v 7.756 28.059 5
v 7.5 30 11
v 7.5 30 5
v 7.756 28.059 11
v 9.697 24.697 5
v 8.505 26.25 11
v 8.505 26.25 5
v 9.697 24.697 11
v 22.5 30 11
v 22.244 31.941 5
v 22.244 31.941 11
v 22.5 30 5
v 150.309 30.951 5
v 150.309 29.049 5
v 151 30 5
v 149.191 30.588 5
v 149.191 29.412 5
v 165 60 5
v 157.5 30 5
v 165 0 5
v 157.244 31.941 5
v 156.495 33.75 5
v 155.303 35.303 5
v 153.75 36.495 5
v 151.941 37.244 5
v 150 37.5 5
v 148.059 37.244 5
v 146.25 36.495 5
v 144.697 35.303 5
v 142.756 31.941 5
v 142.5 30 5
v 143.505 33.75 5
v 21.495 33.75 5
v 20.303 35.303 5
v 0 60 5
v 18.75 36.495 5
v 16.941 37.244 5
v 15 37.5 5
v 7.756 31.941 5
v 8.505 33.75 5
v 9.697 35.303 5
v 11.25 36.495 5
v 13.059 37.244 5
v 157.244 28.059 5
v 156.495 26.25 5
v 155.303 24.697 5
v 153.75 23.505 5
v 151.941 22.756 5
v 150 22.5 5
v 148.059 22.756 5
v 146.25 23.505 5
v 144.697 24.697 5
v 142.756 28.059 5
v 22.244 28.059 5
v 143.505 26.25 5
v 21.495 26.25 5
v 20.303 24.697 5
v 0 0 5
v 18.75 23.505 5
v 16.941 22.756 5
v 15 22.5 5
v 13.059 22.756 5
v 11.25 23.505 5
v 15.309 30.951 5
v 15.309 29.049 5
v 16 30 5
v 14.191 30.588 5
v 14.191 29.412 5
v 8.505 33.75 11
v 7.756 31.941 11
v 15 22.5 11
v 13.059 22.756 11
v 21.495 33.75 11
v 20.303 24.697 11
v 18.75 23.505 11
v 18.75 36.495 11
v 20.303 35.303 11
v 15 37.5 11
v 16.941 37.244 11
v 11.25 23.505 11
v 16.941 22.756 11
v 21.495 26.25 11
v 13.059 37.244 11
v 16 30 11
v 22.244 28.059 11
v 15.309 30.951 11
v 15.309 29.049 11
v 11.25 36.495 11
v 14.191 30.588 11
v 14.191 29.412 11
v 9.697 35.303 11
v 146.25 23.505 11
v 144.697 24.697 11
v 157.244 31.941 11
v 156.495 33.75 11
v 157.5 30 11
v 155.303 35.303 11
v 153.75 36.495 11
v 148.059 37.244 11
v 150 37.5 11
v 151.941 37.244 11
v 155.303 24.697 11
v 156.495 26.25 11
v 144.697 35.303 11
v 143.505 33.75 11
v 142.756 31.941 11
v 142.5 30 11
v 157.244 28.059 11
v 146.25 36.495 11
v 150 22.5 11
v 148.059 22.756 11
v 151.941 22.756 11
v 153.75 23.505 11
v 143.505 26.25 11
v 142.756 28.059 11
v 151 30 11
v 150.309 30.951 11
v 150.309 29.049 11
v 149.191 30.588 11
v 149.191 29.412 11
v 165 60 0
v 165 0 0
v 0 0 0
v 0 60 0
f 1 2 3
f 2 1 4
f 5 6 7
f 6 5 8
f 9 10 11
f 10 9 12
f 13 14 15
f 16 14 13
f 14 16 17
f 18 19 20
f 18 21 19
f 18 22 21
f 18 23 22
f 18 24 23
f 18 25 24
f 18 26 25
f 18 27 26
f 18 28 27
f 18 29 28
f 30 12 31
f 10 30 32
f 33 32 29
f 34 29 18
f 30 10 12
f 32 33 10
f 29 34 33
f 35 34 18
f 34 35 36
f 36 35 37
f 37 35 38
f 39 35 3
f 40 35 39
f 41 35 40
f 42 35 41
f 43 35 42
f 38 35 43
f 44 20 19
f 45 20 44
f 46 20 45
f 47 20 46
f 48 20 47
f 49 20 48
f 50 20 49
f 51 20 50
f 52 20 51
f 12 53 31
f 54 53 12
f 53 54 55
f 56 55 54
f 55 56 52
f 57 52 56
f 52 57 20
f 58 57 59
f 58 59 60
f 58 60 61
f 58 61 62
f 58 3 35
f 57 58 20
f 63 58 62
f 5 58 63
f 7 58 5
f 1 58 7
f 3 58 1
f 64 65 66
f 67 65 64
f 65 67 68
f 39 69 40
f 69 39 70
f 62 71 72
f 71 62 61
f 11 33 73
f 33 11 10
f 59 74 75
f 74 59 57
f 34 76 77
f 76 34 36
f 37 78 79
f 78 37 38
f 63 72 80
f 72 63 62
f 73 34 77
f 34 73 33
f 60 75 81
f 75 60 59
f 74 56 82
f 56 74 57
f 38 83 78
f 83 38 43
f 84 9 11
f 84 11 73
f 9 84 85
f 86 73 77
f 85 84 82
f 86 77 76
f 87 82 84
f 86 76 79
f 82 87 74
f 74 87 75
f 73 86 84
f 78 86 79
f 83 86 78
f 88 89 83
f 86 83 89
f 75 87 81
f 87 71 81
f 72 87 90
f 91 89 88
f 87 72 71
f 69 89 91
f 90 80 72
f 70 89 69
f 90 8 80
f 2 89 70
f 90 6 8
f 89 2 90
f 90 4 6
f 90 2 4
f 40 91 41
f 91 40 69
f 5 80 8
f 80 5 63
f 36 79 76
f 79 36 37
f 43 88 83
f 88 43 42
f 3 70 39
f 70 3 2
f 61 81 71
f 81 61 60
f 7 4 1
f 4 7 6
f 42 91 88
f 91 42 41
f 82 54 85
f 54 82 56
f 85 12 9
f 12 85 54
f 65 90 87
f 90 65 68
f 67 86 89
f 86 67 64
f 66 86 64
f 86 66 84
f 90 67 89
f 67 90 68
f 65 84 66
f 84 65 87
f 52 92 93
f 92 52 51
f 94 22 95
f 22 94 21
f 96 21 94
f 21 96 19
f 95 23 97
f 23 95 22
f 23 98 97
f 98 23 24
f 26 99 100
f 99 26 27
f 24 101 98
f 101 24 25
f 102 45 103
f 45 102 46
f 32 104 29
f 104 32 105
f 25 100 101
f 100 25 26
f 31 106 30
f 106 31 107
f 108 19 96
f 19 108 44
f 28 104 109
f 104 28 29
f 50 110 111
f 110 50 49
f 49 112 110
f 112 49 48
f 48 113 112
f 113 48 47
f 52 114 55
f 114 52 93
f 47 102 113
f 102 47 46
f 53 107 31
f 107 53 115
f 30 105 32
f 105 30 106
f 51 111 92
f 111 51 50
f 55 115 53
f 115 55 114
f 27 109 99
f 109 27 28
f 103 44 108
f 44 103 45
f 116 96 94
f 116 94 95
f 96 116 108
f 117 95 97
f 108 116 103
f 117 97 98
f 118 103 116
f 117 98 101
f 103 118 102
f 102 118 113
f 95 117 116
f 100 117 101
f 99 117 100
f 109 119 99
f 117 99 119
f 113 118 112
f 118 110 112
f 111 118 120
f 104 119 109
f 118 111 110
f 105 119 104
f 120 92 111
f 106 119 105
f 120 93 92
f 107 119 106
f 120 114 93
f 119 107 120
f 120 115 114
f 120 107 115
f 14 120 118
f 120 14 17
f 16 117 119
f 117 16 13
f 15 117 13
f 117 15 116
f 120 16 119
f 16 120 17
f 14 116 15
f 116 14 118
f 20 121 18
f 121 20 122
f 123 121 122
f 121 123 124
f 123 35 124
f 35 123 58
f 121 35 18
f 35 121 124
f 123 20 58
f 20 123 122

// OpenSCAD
cube([165,60,5]);
difference()
{
  translate([15,30,5]) cylinder(d=15,h=6);
  translate([15,30,0]) cylinder(d=2,h=15);
}
difference()
{
  translate([150,30,5]) cylinder(d=15,h=6);
  translate([150,30,0]) cylinder(d=2,h=15);
}  
